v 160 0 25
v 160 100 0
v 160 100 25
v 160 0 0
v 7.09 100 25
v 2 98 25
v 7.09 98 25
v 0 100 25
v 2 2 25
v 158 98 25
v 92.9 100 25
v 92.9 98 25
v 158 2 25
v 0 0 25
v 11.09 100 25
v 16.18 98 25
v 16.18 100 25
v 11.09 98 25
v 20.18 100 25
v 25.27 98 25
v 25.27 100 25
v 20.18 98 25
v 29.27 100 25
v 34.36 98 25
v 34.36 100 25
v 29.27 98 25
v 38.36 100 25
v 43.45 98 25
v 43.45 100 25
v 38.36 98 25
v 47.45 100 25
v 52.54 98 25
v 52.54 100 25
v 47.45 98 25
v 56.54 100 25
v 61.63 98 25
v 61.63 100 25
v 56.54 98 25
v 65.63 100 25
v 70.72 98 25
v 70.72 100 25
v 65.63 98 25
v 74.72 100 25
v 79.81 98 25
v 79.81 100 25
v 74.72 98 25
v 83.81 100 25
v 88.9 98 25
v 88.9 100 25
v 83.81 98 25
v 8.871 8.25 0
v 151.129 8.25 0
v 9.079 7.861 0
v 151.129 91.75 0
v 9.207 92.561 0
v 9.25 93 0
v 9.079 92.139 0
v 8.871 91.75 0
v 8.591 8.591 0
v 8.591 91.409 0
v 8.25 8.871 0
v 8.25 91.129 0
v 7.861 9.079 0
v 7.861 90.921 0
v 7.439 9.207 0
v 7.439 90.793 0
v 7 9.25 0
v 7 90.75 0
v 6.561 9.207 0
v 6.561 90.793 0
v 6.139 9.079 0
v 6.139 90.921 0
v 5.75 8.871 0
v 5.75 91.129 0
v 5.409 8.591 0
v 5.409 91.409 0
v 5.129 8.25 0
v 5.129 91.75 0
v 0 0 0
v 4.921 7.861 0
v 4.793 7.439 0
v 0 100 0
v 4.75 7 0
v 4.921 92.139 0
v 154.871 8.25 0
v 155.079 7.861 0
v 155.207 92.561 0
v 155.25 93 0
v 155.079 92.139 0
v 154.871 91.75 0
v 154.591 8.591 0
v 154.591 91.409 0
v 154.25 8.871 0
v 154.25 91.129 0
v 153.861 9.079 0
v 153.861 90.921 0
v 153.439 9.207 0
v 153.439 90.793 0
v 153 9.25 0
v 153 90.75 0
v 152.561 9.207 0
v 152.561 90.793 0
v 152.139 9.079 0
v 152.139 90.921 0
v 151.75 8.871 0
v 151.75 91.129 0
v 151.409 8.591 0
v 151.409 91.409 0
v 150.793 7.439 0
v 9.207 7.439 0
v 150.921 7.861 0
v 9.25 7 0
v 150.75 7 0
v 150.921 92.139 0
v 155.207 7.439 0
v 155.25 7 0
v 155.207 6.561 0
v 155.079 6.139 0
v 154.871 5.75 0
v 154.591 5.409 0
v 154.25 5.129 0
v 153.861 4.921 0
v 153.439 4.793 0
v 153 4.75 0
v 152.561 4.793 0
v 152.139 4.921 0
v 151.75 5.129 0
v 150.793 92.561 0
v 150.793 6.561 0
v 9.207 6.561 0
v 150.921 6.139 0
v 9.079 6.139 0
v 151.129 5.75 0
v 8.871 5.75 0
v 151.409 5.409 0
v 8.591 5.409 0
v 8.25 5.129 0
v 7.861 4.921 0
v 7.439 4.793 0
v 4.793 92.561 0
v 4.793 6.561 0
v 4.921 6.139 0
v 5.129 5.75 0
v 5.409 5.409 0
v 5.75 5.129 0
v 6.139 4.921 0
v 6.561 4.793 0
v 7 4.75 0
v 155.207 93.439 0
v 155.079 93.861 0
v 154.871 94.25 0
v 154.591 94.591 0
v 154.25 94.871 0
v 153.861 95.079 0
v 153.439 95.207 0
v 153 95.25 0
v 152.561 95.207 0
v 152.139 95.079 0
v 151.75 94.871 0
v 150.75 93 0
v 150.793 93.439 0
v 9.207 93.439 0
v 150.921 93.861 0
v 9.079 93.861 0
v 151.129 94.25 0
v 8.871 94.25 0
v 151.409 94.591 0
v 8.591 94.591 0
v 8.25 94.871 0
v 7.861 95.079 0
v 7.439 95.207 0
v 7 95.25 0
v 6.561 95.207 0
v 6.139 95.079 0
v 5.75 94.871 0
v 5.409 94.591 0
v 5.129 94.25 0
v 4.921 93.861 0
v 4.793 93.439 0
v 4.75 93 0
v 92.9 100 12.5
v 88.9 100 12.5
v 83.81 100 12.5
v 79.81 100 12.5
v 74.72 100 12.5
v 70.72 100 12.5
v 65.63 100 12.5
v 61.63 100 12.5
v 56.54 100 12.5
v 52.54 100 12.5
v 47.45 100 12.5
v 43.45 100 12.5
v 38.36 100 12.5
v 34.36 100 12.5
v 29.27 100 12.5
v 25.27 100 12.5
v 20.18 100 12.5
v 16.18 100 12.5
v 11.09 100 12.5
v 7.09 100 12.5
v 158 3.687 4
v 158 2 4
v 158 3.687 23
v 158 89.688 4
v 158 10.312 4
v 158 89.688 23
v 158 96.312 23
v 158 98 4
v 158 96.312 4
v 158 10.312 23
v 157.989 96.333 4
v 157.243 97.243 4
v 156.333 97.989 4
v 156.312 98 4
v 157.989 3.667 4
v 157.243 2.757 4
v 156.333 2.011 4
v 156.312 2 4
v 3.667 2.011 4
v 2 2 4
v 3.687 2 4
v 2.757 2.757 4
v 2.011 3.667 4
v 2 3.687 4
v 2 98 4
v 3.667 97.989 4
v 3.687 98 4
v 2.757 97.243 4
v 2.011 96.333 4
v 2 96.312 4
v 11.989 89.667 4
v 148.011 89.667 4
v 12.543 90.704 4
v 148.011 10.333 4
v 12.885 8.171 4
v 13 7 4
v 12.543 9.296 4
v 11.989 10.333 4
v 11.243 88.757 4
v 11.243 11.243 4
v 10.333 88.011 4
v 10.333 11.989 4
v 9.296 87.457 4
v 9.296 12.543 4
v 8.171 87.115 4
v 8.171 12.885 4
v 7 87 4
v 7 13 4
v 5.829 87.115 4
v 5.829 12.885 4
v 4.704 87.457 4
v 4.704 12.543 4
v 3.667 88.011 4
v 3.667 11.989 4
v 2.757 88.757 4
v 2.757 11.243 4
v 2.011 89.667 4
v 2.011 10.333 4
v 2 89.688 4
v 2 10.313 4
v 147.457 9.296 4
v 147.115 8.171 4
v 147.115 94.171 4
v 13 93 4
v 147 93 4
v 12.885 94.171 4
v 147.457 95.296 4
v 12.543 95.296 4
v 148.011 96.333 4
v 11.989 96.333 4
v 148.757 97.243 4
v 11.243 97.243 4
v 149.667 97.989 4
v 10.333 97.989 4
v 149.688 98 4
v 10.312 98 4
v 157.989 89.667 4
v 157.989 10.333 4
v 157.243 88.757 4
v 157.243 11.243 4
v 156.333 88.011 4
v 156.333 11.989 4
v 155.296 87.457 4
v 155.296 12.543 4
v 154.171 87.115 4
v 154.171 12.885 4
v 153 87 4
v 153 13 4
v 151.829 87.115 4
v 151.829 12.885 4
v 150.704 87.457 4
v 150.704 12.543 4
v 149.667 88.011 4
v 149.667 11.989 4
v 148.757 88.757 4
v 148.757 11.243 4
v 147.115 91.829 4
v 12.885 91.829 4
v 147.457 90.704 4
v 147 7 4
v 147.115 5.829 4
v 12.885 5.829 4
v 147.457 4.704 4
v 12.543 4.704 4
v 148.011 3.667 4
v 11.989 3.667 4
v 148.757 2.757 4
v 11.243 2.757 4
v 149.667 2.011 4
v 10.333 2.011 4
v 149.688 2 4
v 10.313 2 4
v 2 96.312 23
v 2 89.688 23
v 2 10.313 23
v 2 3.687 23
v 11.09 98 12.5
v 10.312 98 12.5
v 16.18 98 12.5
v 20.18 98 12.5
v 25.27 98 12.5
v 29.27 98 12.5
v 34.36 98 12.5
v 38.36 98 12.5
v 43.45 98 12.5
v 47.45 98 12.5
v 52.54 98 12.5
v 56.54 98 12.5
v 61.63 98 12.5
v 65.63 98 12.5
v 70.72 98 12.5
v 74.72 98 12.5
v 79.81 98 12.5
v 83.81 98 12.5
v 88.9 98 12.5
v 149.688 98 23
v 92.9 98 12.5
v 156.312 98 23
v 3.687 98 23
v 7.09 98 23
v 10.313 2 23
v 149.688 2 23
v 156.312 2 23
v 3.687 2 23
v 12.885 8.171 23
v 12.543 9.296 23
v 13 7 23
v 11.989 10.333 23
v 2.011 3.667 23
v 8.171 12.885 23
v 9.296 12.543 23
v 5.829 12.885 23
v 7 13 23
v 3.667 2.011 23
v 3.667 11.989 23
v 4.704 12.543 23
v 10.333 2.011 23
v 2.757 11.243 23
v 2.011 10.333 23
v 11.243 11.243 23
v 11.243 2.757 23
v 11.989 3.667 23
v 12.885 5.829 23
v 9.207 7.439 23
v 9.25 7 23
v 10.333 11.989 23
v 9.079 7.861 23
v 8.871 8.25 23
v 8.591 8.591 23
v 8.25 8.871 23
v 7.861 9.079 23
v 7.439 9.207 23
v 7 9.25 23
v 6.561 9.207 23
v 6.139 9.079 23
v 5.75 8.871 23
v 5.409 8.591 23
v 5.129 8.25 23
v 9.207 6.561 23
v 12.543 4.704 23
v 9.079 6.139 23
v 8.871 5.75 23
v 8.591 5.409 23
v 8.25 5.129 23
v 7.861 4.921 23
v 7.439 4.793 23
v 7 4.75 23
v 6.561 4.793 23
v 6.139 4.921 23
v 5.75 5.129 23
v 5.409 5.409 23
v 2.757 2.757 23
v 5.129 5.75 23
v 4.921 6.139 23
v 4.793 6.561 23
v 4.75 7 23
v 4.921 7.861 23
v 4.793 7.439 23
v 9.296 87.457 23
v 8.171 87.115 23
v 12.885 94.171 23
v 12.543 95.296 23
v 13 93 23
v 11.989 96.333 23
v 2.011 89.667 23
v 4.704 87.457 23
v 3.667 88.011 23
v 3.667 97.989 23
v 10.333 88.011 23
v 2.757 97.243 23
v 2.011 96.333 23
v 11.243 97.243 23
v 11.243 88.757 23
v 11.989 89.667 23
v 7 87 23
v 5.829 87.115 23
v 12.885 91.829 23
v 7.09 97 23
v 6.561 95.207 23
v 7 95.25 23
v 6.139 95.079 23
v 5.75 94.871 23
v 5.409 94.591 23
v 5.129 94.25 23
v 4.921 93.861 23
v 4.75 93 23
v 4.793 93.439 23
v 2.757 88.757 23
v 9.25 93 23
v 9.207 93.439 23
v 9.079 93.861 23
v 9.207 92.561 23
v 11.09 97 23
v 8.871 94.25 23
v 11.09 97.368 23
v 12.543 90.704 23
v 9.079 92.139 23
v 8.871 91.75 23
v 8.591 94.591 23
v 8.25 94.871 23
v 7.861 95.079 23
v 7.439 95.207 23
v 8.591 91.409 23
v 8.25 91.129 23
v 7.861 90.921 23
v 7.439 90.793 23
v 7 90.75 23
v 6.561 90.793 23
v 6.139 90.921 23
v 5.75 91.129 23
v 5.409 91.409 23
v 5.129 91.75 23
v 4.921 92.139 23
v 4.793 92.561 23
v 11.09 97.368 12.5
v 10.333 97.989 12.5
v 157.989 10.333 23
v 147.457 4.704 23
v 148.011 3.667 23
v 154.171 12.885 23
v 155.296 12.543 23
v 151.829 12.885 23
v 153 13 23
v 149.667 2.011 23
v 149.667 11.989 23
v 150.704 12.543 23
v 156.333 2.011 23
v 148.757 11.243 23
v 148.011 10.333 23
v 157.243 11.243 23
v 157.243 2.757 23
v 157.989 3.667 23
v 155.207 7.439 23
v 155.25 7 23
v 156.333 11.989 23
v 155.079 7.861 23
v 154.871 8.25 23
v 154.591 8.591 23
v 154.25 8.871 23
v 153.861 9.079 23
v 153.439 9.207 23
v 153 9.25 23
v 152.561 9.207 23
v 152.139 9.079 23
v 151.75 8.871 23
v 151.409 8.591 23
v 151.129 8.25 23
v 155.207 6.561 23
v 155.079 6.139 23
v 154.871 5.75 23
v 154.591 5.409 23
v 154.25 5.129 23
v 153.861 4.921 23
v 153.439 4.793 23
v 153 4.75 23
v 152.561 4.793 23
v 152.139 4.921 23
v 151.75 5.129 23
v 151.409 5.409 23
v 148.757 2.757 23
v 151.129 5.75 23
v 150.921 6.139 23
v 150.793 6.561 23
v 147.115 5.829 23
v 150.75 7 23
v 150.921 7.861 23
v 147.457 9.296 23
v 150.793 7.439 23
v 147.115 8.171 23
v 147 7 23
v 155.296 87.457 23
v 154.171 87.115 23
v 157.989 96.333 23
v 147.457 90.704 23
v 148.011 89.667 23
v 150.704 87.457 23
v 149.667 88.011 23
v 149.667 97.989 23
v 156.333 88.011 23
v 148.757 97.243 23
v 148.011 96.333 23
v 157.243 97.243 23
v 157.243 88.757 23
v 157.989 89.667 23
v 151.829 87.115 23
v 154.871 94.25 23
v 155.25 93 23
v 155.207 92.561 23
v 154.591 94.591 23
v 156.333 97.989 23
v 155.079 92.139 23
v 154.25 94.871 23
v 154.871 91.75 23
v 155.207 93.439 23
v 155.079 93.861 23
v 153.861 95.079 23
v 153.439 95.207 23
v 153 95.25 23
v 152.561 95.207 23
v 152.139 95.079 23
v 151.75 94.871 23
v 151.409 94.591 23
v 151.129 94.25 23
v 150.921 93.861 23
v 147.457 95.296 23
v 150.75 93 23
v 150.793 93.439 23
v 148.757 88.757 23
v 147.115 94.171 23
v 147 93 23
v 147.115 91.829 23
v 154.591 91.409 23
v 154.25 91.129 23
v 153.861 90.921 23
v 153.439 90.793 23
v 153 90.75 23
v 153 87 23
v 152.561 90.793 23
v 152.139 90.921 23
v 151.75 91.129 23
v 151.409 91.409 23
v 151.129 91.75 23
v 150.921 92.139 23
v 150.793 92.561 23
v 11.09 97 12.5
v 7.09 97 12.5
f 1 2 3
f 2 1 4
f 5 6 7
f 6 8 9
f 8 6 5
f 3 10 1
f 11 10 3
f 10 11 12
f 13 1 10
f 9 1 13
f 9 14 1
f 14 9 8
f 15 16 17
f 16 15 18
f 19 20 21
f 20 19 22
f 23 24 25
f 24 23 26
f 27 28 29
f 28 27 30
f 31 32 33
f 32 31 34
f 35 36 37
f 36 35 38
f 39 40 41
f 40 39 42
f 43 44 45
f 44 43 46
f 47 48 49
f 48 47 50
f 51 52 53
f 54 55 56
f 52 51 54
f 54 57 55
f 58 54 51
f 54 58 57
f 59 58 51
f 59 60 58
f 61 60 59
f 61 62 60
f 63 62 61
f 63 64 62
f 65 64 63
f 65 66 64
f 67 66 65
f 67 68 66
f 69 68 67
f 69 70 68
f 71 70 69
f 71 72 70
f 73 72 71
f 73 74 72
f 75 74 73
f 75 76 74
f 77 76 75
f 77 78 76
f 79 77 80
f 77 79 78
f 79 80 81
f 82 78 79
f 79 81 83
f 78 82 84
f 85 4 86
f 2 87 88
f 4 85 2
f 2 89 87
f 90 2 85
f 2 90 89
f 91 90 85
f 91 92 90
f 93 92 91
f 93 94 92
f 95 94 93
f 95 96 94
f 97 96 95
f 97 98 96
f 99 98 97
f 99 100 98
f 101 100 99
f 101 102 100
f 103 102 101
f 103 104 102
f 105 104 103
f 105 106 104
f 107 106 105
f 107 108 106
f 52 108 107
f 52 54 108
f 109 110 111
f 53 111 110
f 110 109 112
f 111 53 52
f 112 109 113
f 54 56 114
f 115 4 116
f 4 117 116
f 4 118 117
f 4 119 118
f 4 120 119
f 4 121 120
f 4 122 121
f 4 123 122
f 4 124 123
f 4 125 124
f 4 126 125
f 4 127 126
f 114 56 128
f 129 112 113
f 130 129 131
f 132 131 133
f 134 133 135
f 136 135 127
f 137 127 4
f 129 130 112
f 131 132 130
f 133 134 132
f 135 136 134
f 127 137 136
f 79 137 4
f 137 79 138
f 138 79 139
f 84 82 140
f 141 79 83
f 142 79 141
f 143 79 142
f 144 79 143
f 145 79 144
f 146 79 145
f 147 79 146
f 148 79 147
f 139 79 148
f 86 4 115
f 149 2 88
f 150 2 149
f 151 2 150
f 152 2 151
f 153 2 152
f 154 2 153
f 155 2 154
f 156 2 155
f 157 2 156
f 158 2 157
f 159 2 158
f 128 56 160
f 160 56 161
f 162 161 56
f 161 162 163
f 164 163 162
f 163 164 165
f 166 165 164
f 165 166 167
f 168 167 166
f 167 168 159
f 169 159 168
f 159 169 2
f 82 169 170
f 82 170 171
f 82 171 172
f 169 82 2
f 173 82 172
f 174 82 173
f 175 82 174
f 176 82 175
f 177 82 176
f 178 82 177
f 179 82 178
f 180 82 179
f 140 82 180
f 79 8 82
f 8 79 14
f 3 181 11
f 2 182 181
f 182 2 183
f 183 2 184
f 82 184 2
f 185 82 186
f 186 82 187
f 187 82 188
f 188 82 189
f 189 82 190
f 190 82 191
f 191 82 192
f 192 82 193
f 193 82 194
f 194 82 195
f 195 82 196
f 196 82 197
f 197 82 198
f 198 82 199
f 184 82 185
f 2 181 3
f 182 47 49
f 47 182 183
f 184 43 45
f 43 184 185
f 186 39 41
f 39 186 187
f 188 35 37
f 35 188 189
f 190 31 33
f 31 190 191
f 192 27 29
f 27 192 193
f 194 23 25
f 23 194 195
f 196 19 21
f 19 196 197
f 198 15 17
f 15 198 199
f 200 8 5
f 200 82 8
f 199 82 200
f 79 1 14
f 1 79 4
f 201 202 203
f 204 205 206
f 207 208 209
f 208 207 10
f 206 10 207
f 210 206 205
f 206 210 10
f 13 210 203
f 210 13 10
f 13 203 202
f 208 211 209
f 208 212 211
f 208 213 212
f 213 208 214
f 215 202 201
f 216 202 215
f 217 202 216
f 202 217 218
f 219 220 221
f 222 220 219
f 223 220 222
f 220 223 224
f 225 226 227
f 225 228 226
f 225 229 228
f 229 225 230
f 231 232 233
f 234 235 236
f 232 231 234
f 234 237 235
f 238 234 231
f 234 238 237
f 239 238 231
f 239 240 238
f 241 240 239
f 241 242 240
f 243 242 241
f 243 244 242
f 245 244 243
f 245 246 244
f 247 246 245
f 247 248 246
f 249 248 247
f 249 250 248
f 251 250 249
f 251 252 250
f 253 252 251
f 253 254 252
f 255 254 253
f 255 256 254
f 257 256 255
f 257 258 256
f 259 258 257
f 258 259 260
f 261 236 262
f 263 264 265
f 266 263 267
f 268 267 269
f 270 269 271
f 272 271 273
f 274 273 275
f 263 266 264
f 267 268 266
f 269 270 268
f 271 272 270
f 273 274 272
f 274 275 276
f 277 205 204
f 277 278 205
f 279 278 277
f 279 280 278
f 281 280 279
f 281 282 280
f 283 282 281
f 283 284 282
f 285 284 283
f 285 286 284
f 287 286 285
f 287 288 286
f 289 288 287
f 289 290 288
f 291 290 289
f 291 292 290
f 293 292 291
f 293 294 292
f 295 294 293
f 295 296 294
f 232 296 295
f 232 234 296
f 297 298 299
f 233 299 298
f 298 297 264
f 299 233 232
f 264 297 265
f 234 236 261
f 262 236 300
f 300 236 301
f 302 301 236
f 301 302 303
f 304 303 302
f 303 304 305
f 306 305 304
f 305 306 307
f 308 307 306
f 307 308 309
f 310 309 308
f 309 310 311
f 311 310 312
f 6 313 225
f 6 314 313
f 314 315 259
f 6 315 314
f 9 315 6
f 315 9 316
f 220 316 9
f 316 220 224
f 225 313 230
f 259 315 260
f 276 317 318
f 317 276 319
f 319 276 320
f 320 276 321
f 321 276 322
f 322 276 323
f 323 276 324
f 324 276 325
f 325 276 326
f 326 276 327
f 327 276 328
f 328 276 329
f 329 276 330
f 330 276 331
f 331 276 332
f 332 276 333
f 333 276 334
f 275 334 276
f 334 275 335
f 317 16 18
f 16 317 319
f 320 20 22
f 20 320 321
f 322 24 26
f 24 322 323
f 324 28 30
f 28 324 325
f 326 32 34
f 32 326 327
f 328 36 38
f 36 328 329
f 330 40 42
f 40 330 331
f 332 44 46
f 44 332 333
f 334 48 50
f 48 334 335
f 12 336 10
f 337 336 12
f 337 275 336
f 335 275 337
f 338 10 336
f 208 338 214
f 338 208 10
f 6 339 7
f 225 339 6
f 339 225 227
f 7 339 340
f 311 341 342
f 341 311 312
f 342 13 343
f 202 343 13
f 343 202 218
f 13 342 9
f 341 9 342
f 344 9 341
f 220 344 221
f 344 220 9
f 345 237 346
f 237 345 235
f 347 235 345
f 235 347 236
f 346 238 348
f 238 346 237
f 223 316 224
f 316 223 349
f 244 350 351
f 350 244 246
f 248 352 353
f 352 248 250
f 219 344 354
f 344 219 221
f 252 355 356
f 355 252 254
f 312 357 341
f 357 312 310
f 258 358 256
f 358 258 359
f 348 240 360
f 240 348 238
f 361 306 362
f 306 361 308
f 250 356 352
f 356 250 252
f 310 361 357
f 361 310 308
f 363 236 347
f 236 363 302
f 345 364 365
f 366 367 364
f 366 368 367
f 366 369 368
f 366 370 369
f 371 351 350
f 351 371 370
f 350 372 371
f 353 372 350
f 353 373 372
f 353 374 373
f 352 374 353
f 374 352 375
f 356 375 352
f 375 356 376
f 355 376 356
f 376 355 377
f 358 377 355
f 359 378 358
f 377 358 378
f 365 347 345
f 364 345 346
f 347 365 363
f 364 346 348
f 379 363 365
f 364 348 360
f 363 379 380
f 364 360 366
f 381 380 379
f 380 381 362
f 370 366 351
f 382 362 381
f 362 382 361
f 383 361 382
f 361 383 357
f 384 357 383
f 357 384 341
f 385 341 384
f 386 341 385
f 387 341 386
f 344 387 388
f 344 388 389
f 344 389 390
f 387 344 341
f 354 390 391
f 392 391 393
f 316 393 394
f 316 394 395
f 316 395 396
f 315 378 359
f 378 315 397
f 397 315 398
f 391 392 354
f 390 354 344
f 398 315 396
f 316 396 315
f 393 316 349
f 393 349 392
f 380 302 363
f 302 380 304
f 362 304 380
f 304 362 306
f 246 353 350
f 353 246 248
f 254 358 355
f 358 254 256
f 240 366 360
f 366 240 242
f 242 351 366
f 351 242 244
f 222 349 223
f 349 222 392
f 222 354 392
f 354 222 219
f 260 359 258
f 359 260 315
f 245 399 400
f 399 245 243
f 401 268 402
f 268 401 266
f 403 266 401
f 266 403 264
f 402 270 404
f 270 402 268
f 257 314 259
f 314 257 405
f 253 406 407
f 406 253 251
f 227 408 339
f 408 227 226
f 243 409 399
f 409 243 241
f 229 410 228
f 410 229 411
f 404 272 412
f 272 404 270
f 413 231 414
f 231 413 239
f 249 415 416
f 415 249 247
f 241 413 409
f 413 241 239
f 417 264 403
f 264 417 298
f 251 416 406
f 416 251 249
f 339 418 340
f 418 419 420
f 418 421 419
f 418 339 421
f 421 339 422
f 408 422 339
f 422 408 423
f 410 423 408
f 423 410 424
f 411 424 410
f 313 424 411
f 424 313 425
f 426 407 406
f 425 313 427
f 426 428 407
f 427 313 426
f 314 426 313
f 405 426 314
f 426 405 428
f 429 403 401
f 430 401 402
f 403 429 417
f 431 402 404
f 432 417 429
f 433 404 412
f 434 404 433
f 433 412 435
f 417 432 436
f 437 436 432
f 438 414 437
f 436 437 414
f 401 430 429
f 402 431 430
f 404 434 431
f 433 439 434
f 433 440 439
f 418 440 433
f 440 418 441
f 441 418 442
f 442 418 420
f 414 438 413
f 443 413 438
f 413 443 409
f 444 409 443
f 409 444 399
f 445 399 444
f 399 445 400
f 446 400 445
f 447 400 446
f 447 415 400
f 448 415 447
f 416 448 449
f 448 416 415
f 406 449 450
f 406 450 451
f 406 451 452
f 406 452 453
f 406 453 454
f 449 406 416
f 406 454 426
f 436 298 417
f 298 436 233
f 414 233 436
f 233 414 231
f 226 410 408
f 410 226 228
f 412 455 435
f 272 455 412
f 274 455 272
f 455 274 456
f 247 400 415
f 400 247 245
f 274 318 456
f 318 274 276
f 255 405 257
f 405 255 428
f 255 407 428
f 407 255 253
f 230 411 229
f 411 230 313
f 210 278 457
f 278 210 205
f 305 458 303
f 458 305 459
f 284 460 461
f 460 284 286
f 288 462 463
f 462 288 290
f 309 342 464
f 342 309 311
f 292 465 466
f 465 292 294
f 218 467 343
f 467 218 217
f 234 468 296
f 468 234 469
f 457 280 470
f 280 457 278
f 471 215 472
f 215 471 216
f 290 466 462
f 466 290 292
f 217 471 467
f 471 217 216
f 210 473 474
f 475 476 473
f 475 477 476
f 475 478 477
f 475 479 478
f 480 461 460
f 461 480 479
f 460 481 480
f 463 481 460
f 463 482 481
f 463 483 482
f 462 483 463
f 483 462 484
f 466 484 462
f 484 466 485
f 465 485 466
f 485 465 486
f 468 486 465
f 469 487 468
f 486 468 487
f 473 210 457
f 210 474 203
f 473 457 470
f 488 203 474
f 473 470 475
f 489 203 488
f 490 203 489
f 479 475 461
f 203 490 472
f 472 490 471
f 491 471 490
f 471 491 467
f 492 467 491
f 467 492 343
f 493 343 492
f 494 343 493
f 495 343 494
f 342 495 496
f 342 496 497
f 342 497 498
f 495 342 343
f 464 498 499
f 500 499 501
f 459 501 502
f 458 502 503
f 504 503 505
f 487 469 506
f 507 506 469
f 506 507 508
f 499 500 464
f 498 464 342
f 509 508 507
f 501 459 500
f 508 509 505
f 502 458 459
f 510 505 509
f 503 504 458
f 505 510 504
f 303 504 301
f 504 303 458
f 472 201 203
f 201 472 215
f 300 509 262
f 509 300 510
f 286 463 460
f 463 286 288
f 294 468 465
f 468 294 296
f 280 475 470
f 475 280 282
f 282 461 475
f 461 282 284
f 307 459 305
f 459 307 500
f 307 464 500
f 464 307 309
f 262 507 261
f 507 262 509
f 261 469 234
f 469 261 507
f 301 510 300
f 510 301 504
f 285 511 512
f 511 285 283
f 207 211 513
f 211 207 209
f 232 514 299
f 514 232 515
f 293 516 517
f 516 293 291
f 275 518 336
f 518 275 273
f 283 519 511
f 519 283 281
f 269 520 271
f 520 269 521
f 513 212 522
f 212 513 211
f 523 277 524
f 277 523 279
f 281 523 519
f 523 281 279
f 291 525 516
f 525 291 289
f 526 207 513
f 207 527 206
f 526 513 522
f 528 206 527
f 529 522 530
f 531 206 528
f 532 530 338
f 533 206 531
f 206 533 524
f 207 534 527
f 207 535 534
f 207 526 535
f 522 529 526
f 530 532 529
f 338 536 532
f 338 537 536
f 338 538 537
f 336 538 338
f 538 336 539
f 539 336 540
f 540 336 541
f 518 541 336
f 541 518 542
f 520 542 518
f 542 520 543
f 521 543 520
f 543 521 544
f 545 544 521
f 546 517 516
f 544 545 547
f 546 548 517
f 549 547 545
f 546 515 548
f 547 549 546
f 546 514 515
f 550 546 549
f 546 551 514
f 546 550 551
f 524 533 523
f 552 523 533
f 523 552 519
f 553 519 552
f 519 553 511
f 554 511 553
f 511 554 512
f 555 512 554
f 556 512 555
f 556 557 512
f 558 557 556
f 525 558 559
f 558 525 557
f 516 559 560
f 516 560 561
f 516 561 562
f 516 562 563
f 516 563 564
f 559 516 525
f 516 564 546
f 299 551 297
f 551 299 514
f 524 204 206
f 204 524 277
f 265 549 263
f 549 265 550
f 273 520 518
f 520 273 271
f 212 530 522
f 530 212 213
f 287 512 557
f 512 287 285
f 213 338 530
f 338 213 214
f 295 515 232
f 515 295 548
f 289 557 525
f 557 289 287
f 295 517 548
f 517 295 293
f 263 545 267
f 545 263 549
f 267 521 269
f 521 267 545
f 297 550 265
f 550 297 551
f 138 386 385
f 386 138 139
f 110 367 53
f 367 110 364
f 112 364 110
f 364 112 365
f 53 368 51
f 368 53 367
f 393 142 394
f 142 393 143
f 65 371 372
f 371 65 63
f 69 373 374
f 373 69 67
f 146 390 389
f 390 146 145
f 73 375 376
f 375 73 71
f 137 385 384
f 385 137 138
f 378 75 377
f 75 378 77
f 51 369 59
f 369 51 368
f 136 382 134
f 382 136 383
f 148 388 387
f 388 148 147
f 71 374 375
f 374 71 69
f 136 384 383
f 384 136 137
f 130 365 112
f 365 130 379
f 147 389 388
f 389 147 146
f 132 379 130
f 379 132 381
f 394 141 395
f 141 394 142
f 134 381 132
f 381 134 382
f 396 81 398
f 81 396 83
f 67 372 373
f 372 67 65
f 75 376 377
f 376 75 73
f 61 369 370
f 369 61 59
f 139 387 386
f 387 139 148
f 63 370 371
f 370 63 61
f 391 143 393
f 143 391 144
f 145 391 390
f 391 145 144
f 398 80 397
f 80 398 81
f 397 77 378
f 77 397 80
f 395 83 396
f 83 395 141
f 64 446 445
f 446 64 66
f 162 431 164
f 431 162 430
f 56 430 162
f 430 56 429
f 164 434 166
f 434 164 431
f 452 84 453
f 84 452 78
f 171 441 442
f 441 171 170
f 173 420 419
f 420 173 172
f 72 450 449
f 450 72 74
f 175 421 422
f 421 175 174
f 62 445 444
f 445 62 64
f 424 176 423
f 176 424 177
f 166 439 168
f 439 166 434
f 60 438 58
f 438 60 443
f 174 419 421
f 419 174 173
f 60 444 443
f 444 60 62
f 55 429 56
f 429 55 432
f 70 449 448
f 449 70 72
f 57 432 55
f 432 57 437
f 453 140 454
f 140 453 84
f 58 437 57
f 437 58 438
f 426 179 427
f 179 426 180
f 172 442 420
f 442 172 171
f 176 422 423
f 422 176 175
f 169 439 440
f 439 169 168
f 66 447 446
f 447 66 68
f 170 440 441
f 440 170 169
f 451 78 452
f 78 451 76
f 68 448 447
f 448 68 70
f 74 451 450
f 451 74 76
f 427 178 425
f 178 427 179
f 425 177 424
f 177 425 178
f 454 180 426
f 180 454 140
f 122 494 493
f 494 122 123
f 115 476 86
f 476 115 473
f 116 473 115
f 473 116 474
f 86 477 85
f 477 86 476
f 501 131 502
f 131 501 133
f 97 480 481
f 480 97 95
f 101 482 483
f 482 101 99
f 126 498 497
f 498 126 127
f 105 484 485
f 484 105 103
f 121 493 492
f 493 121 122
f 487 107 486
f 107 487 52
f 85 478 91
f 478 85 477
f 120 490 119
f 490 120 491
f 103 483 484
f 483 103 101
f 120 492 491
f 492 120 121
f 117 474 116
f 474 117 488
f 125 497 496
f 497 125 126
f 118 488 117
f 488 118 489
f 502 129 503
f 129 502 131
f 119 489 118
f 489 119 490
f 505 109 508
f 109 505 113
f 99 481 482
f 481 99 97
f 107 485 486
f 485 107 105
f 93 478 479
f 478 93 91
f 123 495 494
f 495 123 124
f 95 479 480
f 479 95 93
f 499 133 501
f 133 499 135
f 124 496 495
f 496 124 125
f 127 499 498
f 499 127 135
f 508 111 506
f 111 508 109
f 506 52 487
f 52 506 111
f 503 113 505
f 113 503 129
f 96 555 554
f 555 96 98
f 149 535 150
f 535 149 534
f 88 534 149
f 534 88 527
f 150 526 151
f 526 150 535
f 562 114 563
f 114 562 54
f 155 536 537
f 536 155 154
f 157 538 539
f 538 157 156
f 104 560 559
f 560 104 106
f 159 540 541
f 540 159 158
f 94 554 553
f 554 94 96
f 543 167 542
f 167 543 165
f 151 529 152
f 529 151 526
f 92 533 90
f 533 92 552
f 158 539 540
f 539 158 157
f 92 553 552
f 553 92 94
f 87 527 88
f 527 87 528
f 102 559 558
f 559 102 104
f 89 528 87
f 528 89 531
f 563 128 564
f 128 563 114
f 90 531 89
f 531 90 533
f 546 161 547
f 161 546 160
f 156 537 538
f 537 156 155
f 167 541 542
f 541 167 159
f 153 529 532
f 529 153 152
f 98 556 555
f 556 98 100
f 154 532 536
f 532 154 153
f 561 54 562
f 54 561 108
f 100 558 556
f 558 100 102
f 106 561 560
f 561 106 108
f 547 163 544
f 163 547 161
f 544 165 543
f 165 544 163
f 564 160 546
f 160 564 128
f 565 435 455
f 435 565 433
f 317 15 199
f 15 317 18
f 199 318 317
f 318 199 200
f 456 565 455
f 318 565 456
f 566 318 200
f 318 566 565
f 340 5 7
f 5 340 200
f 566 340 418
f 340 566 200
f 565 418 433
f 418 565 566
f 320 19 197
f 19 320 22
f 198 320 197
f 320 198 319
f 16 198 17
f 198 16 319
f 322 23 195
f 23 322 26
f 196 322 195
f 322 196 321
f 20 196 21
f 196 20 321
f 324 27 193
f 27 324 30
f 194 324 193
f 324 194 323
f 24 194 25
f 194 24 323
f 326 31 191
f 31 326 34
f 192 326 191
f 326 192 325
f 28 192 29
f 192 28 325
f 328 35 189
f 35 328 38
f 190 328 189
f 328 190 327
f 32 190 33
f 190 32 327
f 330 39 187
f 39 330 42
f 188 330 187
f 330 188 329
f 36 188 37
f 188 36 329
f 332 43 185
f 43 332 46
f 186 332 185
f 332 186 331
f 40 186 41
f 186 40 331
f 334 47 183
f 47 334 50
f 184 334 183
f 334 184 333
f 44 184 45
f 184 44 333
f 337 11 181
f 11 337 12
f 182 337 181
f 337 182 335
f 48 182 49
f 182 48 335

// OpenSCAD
$fn = 32;

// ----------------------------------------------------------------------
// Enclosure body: 160 x 100 x 25 mm, wall 2 mm
// ----------------------------------------------------------------------

// --- parameters (mm) ---
length = 160;             // outside length, X
width = 100;              // outside width, Y
height = 25;              // outside height, Z
wall = 2;                 // side wall thickness
floor_t = 4;              // floor thickness
boss_d = 12;              // corner boss diameter
boss_h = 19;              // corner boss height above the floor
boss_hole_d = 4.5;        // lid screw clearance in the boss
boss_lip = 7;             // boss centre inset from the corner
vent_slots = 10;          // vent slots in the long wall
vent_w = 4;               // vent slot width
vent_h = 25;              // vent slot height
vent_pitch = 9.09;        // vent slot pitch
vent_z = 12.5;            // vent slot sill height

module shell() {
  difference() {
    cube([length, width, height]);
    /* hollow, open at the top */
    translate([wall, wall, floor_t])
      cube([length - 2 * wall, width - 2 * wall, height]);
  }
}

module bosses() {
  /* corner bosses, sunk 1 mm into the floor */
  for (sx = [0, 1]) for (sy = [0, 1])
    translate([sx * (length - 2 * boss_lip) + boss_lip, sy * (width - 2 * boss_lip) + boss_lip, floor_t - 1])
      cylinder(h = boss_h + 1, d = boss_d);
}

difference() {
  union() {
    shell();
    bosses();
  }
  /* boss screw holes */
  for (sx = [0, 1]) for (sy = [0, 1])
    translate([sx * (length - 2 * boss_lip) + boss_lip, sy * (width - 2 * boss_lip) + boss_lip, -1]) cylinder(h = floor_t + boss_h + 2, d = boss_hole_d);
  /* vent grille in the +Y wall */
  for (i = [0 : vent_slots - 1]) translate([vent_pitch * (i + 1) - vent_w / 2, width - wall - 1, vent_z]) cube([vent_w, wall + 2, vent_h]);
}
